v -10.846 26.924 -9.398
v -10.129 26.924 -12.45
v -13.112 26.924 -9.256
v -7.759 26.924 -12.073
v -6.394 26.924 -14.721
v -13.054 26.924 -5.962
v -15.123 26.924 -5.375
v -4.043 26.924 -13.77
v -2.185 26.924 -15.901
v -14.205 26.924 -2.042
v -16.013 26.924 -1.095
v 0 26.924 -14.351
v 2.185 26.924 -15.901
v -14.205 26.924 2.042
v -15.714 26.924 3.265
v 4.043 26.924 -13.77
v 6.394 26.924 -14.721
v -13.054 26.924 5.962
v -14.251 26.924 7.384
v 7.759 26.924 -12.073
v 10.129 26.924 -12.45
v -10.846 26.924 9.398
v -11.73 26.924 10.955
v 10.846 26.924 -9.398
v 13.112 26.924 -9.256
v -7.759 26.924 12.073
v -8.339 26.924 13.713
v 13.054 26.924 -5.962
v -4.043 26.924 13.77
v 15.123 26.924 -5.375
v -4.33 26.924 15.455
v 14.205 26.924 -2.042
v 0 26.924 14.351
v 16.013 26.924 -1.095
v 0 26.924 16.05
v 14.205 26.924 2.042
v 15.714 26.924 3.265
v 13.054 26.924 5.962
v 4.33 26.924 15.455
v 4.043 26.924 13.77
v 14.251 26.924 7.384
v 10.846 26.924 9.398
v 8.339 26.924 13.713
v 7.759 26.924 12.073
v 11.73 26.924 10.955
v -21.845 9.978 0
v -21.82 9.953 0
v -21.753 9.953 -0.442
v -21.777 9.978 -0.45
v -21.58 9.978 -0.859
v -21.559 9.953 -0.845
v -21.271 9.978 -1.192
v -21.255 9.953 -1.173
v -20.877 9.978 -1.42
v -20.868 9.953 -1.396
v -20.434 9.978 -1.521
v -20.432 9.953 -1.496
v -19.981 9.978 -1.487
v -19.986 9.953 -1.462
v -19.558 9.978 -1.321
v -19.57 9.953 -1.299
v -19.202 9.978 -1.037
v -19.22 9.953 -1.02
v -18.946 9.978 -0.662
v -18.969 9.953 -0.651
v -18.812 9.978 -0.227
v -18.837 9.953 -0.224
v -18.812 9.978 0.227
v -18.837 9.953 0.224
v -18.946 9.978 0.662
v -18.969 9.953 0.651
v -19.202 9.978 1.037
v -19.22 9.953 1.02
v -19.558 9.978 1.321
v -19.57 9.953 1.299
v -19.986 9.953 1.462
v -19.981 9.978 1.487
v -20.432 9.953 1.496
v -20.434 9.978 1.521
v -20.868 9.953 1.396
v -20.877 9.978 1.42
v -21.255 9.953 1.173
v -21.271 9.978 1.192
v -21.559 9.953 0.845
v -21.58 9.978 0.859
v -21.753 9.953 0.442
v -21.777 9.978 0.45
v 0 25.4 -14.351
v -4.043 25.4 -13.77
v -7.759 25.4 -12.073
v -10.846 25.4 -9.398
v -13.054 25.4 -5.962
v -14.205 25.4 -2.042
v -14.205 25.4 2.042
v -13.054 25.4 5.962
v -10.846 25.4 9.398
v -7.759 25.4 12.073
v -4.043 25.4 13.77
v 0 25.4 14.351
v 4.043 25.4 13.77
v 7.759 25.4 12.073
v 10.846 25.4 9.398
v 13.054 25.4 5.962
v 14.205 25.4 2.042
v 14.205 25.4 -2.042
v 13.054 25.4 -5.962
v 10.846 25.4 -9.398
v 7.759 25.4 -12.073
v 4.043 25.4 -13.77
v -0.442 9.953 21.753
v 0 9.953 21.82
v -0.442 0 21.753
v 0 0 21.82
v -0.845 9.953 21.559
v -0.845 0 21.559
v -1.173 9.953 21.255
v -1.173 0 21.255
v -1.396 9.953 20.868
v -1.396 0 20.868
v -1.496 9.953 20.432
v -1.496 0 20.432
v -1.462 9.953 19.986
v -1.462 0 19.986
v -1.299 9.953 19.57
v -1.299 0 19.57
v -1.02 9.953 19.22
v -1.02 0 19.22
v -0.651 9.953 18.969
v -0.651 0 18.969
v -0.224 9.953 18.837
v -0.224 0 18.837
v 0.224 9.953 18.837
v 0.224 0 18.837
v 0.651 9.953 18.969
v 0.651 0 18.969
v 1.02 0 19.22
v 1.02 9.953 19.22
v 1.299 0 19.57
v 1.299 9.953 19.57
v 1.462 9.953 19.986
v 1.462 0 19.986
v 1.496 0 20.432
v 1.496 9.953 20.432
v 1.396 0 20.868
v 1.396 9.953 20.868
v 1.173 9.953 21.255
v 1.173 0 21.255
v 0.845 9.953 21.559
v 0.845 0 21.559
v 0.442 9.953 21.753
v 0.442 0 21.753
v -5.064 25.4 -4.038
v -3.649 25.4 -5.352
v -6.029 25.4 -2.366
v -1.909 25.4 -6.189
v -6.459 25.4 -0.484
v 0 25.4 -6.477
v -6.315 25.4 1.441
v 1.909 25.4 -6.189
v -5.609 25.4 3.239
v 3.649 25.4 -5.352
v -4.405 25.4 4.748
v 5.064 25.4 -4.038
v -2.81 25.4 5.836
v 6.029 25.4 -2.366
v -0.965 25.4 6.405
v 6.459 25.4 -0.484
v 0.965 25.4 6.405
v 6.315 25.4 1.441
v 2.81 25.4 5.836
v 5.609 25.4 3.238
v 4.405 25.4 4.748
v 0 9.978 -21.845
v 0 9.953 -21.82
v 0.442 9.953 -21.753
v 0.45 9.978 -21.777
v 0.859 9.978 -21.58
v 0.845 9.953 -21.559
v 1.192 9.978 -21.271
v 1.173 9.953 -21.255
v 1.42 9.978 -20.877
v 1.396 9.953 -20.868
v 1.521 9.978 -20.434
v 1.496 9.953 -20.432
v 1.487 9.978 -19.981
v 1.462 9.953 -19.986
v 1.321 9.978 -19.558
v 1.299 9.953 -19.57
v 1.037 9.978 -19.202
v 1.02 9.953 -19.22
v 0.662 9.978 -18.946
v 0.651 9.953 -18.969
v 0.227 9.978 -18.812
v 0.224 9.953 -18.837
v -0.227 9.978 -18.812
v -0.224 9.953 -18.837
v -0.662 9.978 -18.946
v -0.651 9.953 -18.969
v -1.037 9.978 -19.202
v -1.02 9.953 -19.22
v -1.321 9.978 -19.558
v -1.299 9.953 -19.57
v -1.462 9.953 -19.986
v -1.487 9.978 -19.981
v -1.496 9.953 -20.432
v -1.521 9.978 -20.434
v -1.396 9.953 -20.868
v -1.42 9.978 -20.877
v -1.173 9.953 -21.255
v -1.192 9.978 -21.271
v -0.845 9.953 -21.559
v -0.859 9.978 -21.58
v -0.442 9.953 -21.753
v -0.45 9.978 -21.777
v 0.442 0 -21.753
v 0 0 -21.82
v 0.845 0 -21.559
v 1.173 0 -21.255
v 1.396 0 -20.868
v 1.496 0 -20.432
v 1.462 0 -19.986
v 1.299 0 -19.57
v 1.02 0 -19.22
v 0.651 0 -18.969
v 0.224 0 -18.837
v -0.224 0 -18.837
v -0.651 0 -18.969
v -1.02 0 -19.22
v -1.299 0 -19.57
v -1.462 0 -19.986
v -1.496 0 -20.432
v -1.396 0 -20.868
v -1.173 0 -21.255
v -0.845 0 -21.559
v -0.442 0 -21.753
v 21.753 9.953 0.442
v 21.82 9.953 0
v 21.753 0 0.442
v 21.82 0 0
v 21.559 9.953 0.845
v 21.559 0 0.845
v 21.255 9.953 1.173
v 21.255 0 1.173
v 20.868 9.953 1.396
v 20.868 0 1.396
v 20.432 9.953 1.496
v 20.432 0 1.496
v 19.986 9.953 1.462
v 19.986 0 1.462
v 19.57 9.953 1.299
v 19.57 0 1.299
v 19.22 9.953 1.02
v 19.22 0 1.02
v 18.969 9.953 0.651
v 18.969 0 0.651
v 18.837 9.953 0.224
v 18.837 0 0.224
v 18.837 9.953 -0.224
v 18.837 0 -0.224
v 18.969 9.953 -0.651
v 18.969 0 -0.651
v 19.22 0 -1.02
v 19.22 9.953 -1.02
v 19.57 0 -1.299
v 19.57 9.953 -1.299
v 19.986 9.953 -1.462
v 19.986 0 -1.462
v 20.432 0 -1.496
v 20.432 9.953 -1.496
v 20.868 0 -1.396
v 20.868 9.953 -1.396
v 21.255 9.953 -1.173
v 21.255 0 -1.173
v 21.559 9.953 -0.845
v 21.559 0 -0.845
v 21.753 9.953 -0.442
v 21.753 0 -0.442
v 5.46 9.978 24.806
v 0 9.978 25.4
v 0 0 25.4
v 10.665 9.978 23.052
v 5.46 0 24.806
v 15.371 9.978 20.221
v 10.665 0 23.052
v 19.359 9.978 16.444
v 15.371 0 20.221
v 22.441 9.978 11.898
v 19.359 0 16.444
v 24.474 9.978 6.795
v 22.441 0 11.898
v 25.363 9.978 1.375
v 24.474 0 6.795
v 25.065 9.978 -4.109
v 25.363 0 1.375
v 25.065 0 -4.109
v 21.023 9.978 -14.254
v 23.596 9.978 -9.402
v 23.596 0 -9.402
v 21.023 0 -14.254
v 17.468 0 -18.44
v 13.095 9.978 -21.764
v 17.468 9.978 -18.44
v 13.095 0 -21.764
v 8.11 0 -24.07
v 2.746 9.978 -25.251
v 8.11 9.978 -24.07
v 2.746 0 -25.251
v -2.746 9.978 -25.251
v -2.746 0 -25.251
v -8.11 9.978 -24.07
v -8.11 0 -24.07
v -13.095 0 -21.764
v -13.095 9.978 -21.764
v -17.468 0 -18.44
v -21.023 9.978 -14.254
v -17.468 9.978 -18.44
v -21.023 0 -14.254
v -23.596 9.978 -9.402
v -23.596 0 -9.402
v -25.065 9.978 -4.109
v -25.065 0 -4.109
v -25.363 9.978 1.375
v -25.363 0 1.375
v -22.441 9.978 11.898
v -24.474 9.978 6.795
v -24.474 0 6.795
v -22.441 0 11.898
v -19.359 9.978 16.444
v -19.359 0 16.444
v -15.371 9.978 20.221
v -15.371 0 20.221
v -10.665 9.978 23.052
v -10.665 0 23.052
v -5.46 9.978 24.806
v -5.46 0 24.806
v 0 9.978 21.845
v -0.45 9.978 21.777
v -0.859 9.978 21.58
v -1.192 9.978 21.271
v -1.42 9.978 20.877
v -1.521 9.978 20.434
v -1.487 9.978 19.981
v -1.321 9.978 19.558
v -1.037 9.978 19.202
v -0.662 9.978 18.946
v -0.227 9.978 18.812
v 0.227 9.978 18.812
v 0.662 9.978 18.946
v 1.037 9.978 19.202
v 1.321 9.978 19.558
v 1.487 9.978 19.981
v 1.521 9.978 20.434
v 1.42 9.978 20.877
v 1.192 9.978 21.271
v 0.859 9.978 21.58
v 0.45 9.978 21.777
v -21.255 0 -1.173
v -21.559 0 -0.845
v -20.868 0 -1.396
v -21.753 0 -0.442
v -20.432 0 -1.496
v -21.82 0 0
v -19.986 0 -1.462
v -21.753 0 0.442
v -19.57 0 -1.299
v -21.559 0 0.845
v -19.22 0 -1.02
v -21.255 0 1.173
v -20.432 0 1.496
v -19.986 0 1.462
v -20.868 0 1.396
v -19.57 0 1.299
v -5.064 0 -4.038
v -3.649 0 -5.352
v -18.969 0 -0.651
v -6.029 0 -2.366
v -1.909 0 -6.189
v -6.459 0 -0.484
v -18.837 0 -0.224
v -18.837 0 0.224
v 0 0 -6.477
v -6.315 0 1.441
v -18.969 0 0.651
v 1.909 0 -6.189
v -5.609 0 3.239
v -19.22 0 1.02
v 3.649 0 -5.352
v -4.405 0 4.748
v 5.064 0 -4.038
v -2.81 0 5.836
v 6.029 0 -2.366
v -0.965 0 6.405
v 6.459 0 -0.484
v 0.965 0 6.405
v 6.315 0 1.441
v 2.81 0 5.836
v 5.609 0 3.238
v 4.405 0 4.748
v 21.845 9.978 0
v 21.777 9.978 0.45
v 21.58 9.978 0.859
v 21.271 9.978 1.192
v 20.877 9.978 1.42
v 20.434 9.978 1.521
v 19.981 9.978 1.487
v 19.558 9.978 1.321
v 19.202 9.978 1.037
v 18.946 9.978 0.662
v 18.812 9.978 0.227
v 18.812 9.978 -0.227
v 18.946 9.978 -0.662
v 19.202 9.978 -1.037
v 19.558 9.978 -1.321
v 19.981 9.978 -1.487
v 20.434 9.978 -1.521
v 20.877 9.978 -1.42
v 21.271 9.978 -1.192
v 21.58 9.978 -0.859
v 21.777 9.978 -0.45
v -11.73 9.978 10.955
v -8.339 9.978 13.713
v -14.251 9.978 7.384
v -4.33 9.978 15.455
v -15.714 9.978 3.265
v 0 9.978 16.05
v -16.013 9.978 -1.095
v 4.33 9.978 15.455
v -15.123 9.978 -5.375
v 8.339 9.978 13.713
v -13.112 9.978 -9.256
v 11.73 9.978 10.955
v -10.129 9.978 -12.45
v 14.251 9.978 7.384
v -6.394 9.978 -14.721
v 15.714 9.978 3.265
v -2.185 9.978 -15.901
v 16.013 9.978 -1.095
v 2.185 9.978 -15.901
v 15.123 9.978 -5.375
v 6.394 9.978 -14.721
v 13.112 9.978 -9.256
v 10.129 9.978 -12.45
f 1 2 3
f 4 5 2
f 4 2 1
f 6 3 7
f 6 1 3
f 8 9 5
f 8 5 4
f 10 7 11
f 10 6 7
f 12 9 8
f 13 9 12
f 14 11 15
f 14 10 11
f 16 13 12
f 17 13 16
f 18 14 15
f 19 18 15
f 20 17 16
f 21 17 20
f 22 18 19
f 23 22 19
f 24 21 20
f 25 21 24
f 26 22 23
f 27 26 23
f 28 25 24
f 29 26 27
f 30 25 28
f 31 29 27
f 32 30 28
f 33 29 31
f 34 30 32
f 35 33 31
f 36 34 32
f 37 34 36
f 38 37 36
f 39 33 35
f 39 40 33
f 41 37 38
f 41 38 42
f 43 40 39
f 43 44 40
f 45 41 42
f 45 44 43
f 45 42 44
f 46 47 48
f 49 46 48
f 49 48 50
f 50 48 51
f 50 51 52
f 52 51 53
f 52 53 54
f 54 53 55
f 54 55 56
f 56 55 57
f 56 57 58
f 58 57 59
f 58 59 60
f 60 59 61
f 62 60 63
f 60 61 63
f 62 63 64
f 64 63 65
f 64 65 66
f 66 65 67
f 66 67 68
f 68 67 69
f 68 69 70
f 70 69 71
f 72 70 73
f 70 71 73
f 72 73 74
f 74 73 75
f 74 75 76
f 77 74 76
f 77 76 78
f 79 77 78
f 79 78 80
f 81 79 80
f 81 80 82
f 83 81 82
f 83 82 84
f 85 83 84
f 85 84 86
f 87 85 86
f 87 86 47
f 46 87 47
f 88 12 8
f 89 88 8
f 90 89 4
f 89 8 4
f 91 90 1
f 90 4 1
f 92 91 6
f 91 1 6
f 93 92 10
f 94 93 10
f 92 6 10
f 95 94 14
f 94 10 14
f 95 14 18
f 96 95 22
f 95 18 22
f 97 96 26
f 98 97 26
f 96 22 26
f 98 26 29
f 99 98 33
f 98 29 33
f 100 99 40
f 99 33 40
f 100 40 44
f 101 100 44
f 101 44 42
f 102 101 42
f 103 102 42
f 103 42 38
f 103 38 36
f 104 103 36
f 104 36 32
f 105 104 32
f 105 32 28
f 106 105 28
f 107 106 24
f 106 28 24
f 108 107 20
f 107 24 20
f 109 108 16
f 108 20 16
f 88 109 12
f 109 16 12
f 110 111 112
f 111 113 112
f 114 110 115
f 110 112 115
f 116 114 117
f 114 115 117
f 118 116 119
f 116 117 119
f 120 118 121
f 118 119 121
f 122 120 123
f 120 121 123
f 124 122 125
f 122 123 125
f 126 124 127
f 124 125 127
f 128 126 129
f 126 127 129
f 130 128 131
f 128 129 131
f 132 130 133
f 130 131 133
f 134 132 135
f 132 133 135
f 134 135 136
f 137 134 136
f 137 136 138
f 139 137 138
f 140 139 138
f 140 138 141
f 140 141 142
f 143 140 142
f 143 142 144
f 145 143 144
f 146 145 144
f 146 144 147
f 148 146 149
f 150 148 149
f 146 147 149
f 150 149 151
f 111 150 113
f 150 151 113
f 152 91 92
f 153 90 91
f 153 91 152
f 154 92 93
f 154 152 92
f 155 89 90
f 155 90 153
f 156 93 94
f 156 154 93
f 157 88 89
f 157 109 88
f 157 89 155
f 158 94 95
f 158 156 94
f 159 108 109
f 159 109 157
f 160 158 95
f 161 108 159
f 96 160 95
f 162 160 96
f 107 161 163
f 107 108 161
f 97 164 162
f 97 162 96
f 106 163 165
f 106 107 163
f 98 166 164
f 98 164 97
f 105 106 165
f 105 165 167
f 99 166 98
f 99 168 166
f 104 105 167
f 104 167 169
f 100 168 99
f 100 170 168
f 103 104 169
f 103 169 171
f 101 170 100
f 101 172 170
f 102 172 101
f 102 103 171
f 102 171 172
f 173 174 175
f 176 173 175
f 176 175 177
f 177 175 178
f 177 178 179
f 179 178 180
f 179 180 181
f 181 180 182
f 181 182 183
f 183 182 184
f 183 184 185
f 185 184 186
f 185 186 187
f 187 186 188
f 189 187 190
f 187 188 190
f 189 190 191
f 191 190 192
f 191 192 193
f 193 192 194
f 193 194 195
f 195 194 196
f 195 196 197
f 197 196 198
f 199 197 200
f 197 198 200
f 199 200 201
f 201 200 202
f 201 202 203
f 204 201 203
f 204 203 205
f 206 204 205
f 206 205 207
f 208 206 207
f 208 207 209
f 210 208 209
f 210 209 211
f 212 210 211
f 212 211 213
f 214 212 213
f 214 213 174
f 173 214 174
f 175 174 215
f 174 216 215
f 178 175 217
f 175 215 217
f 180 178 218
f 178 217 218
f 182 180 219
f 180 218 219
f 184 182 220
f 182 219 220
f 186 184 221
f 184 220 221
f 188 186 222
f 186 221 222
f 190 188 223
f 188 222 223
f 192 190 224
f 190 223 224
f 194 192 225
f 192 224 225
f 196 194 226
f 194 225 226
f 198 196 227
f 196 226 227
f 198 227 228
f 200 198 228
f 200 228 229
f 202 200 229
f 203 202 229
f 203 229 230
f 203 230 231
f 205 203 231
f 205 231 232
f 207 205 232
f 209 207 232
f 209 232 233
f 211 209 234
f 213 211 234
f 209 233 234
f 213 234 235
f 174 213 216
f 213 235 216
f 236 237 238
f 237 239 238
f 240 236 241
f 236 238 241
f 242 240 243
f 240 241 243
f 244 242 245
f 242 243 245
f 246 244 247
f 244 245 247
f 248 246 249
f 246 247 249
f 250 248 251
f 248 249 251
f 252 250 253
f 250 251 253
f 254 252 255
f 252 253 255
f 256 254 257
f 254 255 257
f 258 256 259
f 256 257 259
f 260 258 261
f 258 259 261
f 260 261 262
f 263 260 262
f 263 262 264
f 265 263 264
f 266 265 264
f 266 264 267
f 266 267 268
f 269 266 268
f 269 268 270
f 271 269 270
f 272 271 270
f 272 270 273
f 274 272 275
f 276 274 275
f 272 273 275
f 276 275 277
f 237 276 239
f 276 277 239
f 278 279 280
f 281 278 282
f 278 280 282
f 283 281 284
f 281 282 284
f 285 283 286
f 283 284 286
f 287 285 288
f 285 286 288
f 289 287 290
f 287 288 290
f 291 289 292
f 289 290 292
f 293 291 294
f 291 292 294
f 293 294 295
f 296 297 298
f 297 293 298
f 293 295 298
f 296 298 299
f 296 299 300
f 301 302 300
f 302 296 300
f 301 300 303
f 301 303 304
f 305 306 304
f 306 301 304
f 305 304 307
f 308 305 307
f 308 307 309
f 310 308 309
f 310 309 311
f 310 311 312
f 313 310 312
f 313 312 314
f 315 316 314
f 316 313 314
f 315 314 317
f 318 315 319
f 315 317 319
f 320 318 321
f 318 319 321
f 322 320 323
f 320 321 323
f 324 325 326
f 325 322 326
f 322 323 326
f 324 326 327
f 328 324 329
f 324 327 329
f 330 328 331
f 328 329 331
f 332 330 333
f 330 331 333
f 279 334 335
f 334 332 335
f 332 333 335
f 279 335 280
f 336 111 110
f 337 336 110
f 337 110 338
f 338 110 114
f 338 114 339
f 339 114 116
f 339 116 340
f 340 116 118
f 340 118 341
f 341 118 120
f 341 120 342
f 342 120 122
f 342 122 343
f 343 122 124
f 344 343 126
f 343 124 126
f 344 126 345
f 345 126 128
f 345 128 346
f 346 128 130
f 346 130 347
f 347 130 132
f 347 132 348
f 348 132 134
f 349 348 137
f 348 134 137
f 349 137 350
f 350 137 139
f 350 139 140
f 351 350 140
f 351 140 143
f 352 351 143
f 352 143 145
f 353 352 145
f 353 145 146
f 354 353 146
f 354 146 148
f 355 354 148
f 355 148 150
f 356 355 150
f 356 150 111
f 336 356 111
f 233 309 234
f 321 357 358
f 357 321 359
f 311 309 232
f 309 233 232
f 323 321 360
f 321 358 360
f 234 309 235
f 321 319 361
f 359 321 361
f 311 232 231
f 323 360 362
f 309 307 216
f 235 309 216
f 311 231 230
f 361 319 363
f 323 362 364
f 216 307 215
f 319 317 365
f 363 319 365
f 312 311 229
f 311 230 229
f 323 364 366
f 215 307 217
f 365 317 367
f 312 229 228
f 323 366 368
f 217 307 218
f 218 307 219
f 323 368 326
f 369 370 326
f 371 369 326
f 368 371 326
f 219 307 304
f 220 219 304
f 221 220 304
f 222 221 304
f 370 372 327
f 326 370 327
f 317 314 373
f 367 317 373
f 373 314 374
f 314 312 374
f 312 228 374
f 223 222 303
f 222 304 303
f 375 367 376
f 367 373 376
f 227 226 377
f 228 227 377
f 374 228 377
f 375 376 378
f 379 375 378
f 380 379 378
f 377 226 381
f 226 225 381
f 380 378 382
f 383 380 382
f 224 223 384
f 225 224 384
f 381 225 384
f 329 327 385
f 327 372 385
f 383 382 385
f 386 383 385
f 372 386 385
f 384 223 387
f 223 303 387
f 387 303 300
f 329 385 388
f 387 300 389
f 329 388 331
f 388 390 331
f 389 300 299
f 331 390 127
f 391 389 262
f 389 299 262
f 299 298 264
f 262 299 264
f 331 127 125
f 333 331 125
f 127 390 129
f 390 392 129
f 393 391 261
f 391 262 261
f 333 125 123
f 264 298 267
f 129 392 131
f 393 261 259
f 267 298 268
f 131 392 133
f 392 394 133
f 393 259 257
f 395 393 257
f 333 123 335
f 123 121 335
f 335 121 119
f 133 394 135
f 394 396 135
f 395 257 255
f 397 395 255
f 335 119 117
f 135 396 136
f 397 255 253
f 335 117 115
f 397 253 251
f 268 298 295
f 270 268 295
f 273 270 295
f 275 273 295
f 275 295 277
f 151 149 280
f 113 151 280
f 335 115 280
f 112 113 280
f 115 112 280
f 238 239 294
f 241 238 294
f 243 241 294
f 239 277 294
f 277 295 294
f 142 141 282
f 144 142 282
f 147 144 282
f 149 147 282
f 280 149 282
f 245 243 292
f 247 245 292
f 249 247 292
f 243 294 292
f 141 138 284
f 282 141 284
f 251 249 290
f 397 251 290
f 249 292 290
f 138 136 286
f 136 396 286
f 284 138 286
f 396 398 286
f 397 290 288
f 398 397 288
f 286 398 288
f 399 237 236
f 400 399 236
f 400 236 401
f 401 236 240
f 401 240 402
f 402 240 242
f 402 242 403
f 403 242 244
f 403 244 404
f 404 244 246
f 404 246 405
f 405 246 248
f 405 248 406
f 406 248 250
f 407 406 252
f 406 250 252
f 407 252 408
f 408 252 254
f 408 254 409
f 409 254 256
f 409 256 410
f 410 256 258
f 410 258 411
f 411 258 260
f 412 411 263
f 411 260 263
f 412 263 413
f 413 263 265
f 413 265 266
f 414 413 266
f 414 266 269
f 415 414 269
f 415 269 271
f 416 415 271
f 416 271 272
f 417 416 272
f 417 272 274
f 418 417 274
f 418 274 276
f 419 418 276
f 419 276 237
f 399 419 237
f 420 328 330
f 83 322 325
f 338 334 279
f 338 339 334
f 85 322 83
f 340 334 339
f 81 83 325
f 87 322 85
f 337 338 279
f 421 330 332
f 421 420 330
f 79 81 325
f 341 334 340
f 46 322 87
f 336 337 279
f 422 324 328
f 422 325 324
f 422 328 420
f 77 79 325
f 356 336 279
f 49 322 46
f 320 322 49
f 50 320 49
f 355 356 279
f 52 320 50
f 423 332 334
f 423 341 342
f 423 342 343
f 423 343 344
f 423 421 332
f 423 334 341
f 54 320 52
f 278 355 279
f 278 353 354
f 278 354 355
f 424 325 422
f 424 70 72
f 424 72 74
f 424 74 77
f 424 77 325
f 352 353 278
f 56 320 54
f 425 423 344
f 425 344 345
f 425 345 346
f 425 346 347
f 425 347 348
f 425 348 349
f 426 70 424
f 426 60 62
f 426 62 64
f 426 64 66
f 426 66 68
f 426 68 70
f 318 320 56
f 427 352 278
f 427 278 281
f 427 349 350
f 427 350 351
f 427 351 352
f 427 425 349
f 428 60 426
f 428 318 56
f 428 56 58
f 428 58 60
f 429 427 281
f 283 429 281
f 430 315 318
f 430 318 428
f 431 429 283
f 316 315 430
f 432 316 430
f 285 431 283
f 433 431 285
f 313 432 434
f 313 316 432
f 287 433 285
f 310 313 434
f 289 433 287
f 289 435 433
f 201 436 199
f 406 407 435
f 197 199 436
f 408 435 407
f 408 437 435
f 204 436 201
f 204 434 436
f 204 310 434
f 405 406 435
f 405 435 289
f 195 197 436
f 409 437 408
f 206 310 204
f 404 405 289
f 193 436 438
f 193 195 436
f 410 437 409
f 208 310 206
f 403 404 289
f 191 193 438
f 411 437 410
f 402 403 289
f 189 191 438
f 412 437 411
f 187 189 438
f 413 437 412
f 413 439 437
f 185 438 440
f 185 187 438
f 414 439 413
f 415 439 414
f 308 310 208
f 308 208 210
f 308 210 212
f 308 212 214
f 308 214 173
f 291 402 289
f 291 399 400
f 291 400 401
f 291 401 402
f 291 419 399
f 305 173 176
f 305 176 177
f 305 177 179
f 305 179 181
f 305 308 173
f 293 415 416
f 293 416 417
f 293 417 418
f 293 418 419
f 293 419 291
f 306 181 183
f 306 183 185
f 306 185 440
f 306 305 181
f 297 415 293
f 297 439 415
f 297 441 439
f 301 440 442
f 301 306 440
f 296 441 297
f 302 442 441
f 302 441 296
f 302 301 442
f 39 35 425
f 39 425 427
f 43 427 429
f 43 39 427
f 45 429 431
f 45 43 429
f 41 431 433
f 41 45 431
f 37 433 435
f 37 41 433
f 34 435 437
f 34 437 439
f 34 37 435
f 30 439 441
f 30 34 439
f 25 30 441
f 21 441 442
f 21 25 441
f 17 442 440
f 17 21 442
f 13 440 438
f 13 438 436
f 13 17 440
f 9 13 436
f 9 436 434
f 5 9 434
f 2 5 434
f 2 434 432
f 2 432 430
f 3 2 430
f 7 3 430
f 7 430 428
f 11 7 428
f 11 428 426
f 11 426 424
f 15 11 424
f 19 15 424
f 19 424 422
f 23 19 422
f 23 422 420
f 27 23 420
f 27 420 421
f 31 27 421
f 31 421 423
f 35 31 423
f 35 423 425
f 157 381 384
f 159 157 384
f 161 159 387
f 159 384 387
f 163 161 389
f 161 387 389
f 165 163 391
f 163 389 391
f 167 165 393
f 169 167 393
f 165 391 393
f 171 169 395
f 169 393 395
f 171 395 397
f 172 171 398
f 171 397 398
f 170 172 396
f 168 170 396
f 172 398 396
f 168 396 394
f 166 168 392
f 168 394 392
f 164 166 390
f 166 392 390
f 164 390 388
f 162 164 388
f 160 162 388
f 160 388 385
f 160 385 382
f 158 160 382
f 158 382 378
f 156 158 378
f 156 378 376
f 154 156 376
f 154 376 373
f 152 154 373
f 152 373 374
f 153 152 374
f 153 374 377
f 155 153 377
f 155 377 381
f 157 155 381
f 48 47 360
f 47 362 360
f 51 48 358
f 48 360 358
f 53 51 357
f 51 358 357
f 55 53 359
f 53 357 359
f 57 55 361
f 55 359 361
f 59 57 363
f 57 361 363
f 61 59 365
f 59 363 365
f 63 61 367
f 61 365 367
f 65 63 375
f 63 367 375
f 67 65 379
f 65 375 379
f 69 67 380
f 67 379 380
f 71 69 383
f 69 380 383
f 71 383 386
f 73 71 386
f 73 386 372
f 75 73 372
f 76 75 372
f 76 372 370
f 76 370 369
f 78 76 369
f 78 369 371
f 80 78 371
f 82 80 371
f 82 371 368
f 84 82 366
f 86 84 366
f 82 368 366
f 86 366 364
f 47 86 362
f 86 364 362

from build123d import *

# Parameters (mm, degrees)
SKETCH1_R                       = 25.4
BOSS_EXTRUDE1_DEPTH             = 25.4
SKETCH2_OUTSIDE_W               = 68.04
SKETCH2_OUTSIDE_H               = 68.04
SKETCH2_OUTSIDE_R               = 16.05
CUT_EXTRUDE1_DEPTH              = 15.422
SKETCH3_R                       = 6.477
CUT_EXTRUDE2_DEPTH              = 44.994090512
BOSS_EXTRUDE2_START             = 1.524
SKETCH4_R                       = 16.05
SKETCH4_R_2                     = 14.351
BOSS_EXTRUDE2_DEPTH             = 1.524
F_3_0MM_DOWEL_HOLE1_D           = 3
F_3_0MM_DOWEL_HOLE1_CSINK_D     = 3.05
F_3_0MM_DOWEL_HOLE1_CSINK_ANGLE = 90
CIRPATTERN1_COUNT               = 4


with BuildPart() as part:
    # Sketch1 → Boss-Extrude1 (new body)
    with BuildSketch(Plane(origin=(0, 0, 0), x_dir=(1, 0, 0), z_dir=(0, 1, 0))):
        with Locations(Location((0, 0, 0), (0, 0, 270))):
            Circle(SKETCH1_R)
    extrude(amount=BOSS_EXTRUDE1_DEPTH)

    # Sketch2 outside → Cut-Extrude1 (cut)
    with BuildSketch(Plane(origin=(0, 25.4, 0), x_dir=(1, 0, 0), z_dir=(0, 1, 0))):
        Rectangle(SKETCH2_OUTSIDE_W, SKETCH2_OUTSIDE_H)
        with Locations(Location((0, 0, 0), (0, 0, 270))):
            Circle(SKETCH2_OUTSIDE_R, mode=Mode.SUBTRACT)
    extrude(amount=-CUT_EXTRUDE1_DEPTH, mode=Mode.SUBTRACT)

    # Sketch3 → Cut-Extrude2 (cut, through all)
    with BuildSketch(Plane.XZ):
        with Locations(Location((0, 0, 0), (0, 0, 270))):
            Circle(SKETCH3_R)
    extrude(amount=-CUT_EXTRUDE2_DEPTH, mode=Mode.SUBTRACT)

    # Sketch4 → Boss-Extrude2 (add)
    with BuildSketch(Plane(origin=(0, 25.4, 0), x_dir=(1, 0, 0), z_dir=(0, 1, 0)).offset(BOSS_EXTRUDE2_START)):
        with Locations(Location((0, 0, 0), (0, 0, 270))):
            Circle(SKETCH4_R)
        with Locations(Location((0, 0, 0), (0, 0, 90))):
            Circle(SKETCH4_R_2, mode=Mode.SUBTRACT)
    extrude(amount=-BOSS_EXTRUDE2_DEPTH)

    # Ø3.0mm Dowel Hole1 (through all)
    with Locations(Plane(origin=(0, 9.978, -20.32), x_dir=(0, 0, 1), z_dir=(0, 1, 0))):
        with Locations((0, 0)):
            f_3_0mm_dowel_hole1 = CounterSinkHole(F_3_0MM_DOWEL_HOLE1_D / 2, F_3_0MM_DOWEL_HOLE1_CSINK_D / 2, counter_sink_angle=F_3_0MM_DOWEL_HOLE1_CSINK_ANGLE)

    # CirPattern1: Ø3.0mm Dowel Hole1 ×4 about axis
    cirpattern1_axis = Axis((0, 0, 0), (0, 1, 0))
    for i in range(1, CIRPATTERN1_COUNT):
        add(f_3_0mm_dowel_hole1.rotate(cirpattern1_axis, i * 360 / CIRPATTERN1_COUNT), mode=Mode.SUBTRACT)


solid = part.part
